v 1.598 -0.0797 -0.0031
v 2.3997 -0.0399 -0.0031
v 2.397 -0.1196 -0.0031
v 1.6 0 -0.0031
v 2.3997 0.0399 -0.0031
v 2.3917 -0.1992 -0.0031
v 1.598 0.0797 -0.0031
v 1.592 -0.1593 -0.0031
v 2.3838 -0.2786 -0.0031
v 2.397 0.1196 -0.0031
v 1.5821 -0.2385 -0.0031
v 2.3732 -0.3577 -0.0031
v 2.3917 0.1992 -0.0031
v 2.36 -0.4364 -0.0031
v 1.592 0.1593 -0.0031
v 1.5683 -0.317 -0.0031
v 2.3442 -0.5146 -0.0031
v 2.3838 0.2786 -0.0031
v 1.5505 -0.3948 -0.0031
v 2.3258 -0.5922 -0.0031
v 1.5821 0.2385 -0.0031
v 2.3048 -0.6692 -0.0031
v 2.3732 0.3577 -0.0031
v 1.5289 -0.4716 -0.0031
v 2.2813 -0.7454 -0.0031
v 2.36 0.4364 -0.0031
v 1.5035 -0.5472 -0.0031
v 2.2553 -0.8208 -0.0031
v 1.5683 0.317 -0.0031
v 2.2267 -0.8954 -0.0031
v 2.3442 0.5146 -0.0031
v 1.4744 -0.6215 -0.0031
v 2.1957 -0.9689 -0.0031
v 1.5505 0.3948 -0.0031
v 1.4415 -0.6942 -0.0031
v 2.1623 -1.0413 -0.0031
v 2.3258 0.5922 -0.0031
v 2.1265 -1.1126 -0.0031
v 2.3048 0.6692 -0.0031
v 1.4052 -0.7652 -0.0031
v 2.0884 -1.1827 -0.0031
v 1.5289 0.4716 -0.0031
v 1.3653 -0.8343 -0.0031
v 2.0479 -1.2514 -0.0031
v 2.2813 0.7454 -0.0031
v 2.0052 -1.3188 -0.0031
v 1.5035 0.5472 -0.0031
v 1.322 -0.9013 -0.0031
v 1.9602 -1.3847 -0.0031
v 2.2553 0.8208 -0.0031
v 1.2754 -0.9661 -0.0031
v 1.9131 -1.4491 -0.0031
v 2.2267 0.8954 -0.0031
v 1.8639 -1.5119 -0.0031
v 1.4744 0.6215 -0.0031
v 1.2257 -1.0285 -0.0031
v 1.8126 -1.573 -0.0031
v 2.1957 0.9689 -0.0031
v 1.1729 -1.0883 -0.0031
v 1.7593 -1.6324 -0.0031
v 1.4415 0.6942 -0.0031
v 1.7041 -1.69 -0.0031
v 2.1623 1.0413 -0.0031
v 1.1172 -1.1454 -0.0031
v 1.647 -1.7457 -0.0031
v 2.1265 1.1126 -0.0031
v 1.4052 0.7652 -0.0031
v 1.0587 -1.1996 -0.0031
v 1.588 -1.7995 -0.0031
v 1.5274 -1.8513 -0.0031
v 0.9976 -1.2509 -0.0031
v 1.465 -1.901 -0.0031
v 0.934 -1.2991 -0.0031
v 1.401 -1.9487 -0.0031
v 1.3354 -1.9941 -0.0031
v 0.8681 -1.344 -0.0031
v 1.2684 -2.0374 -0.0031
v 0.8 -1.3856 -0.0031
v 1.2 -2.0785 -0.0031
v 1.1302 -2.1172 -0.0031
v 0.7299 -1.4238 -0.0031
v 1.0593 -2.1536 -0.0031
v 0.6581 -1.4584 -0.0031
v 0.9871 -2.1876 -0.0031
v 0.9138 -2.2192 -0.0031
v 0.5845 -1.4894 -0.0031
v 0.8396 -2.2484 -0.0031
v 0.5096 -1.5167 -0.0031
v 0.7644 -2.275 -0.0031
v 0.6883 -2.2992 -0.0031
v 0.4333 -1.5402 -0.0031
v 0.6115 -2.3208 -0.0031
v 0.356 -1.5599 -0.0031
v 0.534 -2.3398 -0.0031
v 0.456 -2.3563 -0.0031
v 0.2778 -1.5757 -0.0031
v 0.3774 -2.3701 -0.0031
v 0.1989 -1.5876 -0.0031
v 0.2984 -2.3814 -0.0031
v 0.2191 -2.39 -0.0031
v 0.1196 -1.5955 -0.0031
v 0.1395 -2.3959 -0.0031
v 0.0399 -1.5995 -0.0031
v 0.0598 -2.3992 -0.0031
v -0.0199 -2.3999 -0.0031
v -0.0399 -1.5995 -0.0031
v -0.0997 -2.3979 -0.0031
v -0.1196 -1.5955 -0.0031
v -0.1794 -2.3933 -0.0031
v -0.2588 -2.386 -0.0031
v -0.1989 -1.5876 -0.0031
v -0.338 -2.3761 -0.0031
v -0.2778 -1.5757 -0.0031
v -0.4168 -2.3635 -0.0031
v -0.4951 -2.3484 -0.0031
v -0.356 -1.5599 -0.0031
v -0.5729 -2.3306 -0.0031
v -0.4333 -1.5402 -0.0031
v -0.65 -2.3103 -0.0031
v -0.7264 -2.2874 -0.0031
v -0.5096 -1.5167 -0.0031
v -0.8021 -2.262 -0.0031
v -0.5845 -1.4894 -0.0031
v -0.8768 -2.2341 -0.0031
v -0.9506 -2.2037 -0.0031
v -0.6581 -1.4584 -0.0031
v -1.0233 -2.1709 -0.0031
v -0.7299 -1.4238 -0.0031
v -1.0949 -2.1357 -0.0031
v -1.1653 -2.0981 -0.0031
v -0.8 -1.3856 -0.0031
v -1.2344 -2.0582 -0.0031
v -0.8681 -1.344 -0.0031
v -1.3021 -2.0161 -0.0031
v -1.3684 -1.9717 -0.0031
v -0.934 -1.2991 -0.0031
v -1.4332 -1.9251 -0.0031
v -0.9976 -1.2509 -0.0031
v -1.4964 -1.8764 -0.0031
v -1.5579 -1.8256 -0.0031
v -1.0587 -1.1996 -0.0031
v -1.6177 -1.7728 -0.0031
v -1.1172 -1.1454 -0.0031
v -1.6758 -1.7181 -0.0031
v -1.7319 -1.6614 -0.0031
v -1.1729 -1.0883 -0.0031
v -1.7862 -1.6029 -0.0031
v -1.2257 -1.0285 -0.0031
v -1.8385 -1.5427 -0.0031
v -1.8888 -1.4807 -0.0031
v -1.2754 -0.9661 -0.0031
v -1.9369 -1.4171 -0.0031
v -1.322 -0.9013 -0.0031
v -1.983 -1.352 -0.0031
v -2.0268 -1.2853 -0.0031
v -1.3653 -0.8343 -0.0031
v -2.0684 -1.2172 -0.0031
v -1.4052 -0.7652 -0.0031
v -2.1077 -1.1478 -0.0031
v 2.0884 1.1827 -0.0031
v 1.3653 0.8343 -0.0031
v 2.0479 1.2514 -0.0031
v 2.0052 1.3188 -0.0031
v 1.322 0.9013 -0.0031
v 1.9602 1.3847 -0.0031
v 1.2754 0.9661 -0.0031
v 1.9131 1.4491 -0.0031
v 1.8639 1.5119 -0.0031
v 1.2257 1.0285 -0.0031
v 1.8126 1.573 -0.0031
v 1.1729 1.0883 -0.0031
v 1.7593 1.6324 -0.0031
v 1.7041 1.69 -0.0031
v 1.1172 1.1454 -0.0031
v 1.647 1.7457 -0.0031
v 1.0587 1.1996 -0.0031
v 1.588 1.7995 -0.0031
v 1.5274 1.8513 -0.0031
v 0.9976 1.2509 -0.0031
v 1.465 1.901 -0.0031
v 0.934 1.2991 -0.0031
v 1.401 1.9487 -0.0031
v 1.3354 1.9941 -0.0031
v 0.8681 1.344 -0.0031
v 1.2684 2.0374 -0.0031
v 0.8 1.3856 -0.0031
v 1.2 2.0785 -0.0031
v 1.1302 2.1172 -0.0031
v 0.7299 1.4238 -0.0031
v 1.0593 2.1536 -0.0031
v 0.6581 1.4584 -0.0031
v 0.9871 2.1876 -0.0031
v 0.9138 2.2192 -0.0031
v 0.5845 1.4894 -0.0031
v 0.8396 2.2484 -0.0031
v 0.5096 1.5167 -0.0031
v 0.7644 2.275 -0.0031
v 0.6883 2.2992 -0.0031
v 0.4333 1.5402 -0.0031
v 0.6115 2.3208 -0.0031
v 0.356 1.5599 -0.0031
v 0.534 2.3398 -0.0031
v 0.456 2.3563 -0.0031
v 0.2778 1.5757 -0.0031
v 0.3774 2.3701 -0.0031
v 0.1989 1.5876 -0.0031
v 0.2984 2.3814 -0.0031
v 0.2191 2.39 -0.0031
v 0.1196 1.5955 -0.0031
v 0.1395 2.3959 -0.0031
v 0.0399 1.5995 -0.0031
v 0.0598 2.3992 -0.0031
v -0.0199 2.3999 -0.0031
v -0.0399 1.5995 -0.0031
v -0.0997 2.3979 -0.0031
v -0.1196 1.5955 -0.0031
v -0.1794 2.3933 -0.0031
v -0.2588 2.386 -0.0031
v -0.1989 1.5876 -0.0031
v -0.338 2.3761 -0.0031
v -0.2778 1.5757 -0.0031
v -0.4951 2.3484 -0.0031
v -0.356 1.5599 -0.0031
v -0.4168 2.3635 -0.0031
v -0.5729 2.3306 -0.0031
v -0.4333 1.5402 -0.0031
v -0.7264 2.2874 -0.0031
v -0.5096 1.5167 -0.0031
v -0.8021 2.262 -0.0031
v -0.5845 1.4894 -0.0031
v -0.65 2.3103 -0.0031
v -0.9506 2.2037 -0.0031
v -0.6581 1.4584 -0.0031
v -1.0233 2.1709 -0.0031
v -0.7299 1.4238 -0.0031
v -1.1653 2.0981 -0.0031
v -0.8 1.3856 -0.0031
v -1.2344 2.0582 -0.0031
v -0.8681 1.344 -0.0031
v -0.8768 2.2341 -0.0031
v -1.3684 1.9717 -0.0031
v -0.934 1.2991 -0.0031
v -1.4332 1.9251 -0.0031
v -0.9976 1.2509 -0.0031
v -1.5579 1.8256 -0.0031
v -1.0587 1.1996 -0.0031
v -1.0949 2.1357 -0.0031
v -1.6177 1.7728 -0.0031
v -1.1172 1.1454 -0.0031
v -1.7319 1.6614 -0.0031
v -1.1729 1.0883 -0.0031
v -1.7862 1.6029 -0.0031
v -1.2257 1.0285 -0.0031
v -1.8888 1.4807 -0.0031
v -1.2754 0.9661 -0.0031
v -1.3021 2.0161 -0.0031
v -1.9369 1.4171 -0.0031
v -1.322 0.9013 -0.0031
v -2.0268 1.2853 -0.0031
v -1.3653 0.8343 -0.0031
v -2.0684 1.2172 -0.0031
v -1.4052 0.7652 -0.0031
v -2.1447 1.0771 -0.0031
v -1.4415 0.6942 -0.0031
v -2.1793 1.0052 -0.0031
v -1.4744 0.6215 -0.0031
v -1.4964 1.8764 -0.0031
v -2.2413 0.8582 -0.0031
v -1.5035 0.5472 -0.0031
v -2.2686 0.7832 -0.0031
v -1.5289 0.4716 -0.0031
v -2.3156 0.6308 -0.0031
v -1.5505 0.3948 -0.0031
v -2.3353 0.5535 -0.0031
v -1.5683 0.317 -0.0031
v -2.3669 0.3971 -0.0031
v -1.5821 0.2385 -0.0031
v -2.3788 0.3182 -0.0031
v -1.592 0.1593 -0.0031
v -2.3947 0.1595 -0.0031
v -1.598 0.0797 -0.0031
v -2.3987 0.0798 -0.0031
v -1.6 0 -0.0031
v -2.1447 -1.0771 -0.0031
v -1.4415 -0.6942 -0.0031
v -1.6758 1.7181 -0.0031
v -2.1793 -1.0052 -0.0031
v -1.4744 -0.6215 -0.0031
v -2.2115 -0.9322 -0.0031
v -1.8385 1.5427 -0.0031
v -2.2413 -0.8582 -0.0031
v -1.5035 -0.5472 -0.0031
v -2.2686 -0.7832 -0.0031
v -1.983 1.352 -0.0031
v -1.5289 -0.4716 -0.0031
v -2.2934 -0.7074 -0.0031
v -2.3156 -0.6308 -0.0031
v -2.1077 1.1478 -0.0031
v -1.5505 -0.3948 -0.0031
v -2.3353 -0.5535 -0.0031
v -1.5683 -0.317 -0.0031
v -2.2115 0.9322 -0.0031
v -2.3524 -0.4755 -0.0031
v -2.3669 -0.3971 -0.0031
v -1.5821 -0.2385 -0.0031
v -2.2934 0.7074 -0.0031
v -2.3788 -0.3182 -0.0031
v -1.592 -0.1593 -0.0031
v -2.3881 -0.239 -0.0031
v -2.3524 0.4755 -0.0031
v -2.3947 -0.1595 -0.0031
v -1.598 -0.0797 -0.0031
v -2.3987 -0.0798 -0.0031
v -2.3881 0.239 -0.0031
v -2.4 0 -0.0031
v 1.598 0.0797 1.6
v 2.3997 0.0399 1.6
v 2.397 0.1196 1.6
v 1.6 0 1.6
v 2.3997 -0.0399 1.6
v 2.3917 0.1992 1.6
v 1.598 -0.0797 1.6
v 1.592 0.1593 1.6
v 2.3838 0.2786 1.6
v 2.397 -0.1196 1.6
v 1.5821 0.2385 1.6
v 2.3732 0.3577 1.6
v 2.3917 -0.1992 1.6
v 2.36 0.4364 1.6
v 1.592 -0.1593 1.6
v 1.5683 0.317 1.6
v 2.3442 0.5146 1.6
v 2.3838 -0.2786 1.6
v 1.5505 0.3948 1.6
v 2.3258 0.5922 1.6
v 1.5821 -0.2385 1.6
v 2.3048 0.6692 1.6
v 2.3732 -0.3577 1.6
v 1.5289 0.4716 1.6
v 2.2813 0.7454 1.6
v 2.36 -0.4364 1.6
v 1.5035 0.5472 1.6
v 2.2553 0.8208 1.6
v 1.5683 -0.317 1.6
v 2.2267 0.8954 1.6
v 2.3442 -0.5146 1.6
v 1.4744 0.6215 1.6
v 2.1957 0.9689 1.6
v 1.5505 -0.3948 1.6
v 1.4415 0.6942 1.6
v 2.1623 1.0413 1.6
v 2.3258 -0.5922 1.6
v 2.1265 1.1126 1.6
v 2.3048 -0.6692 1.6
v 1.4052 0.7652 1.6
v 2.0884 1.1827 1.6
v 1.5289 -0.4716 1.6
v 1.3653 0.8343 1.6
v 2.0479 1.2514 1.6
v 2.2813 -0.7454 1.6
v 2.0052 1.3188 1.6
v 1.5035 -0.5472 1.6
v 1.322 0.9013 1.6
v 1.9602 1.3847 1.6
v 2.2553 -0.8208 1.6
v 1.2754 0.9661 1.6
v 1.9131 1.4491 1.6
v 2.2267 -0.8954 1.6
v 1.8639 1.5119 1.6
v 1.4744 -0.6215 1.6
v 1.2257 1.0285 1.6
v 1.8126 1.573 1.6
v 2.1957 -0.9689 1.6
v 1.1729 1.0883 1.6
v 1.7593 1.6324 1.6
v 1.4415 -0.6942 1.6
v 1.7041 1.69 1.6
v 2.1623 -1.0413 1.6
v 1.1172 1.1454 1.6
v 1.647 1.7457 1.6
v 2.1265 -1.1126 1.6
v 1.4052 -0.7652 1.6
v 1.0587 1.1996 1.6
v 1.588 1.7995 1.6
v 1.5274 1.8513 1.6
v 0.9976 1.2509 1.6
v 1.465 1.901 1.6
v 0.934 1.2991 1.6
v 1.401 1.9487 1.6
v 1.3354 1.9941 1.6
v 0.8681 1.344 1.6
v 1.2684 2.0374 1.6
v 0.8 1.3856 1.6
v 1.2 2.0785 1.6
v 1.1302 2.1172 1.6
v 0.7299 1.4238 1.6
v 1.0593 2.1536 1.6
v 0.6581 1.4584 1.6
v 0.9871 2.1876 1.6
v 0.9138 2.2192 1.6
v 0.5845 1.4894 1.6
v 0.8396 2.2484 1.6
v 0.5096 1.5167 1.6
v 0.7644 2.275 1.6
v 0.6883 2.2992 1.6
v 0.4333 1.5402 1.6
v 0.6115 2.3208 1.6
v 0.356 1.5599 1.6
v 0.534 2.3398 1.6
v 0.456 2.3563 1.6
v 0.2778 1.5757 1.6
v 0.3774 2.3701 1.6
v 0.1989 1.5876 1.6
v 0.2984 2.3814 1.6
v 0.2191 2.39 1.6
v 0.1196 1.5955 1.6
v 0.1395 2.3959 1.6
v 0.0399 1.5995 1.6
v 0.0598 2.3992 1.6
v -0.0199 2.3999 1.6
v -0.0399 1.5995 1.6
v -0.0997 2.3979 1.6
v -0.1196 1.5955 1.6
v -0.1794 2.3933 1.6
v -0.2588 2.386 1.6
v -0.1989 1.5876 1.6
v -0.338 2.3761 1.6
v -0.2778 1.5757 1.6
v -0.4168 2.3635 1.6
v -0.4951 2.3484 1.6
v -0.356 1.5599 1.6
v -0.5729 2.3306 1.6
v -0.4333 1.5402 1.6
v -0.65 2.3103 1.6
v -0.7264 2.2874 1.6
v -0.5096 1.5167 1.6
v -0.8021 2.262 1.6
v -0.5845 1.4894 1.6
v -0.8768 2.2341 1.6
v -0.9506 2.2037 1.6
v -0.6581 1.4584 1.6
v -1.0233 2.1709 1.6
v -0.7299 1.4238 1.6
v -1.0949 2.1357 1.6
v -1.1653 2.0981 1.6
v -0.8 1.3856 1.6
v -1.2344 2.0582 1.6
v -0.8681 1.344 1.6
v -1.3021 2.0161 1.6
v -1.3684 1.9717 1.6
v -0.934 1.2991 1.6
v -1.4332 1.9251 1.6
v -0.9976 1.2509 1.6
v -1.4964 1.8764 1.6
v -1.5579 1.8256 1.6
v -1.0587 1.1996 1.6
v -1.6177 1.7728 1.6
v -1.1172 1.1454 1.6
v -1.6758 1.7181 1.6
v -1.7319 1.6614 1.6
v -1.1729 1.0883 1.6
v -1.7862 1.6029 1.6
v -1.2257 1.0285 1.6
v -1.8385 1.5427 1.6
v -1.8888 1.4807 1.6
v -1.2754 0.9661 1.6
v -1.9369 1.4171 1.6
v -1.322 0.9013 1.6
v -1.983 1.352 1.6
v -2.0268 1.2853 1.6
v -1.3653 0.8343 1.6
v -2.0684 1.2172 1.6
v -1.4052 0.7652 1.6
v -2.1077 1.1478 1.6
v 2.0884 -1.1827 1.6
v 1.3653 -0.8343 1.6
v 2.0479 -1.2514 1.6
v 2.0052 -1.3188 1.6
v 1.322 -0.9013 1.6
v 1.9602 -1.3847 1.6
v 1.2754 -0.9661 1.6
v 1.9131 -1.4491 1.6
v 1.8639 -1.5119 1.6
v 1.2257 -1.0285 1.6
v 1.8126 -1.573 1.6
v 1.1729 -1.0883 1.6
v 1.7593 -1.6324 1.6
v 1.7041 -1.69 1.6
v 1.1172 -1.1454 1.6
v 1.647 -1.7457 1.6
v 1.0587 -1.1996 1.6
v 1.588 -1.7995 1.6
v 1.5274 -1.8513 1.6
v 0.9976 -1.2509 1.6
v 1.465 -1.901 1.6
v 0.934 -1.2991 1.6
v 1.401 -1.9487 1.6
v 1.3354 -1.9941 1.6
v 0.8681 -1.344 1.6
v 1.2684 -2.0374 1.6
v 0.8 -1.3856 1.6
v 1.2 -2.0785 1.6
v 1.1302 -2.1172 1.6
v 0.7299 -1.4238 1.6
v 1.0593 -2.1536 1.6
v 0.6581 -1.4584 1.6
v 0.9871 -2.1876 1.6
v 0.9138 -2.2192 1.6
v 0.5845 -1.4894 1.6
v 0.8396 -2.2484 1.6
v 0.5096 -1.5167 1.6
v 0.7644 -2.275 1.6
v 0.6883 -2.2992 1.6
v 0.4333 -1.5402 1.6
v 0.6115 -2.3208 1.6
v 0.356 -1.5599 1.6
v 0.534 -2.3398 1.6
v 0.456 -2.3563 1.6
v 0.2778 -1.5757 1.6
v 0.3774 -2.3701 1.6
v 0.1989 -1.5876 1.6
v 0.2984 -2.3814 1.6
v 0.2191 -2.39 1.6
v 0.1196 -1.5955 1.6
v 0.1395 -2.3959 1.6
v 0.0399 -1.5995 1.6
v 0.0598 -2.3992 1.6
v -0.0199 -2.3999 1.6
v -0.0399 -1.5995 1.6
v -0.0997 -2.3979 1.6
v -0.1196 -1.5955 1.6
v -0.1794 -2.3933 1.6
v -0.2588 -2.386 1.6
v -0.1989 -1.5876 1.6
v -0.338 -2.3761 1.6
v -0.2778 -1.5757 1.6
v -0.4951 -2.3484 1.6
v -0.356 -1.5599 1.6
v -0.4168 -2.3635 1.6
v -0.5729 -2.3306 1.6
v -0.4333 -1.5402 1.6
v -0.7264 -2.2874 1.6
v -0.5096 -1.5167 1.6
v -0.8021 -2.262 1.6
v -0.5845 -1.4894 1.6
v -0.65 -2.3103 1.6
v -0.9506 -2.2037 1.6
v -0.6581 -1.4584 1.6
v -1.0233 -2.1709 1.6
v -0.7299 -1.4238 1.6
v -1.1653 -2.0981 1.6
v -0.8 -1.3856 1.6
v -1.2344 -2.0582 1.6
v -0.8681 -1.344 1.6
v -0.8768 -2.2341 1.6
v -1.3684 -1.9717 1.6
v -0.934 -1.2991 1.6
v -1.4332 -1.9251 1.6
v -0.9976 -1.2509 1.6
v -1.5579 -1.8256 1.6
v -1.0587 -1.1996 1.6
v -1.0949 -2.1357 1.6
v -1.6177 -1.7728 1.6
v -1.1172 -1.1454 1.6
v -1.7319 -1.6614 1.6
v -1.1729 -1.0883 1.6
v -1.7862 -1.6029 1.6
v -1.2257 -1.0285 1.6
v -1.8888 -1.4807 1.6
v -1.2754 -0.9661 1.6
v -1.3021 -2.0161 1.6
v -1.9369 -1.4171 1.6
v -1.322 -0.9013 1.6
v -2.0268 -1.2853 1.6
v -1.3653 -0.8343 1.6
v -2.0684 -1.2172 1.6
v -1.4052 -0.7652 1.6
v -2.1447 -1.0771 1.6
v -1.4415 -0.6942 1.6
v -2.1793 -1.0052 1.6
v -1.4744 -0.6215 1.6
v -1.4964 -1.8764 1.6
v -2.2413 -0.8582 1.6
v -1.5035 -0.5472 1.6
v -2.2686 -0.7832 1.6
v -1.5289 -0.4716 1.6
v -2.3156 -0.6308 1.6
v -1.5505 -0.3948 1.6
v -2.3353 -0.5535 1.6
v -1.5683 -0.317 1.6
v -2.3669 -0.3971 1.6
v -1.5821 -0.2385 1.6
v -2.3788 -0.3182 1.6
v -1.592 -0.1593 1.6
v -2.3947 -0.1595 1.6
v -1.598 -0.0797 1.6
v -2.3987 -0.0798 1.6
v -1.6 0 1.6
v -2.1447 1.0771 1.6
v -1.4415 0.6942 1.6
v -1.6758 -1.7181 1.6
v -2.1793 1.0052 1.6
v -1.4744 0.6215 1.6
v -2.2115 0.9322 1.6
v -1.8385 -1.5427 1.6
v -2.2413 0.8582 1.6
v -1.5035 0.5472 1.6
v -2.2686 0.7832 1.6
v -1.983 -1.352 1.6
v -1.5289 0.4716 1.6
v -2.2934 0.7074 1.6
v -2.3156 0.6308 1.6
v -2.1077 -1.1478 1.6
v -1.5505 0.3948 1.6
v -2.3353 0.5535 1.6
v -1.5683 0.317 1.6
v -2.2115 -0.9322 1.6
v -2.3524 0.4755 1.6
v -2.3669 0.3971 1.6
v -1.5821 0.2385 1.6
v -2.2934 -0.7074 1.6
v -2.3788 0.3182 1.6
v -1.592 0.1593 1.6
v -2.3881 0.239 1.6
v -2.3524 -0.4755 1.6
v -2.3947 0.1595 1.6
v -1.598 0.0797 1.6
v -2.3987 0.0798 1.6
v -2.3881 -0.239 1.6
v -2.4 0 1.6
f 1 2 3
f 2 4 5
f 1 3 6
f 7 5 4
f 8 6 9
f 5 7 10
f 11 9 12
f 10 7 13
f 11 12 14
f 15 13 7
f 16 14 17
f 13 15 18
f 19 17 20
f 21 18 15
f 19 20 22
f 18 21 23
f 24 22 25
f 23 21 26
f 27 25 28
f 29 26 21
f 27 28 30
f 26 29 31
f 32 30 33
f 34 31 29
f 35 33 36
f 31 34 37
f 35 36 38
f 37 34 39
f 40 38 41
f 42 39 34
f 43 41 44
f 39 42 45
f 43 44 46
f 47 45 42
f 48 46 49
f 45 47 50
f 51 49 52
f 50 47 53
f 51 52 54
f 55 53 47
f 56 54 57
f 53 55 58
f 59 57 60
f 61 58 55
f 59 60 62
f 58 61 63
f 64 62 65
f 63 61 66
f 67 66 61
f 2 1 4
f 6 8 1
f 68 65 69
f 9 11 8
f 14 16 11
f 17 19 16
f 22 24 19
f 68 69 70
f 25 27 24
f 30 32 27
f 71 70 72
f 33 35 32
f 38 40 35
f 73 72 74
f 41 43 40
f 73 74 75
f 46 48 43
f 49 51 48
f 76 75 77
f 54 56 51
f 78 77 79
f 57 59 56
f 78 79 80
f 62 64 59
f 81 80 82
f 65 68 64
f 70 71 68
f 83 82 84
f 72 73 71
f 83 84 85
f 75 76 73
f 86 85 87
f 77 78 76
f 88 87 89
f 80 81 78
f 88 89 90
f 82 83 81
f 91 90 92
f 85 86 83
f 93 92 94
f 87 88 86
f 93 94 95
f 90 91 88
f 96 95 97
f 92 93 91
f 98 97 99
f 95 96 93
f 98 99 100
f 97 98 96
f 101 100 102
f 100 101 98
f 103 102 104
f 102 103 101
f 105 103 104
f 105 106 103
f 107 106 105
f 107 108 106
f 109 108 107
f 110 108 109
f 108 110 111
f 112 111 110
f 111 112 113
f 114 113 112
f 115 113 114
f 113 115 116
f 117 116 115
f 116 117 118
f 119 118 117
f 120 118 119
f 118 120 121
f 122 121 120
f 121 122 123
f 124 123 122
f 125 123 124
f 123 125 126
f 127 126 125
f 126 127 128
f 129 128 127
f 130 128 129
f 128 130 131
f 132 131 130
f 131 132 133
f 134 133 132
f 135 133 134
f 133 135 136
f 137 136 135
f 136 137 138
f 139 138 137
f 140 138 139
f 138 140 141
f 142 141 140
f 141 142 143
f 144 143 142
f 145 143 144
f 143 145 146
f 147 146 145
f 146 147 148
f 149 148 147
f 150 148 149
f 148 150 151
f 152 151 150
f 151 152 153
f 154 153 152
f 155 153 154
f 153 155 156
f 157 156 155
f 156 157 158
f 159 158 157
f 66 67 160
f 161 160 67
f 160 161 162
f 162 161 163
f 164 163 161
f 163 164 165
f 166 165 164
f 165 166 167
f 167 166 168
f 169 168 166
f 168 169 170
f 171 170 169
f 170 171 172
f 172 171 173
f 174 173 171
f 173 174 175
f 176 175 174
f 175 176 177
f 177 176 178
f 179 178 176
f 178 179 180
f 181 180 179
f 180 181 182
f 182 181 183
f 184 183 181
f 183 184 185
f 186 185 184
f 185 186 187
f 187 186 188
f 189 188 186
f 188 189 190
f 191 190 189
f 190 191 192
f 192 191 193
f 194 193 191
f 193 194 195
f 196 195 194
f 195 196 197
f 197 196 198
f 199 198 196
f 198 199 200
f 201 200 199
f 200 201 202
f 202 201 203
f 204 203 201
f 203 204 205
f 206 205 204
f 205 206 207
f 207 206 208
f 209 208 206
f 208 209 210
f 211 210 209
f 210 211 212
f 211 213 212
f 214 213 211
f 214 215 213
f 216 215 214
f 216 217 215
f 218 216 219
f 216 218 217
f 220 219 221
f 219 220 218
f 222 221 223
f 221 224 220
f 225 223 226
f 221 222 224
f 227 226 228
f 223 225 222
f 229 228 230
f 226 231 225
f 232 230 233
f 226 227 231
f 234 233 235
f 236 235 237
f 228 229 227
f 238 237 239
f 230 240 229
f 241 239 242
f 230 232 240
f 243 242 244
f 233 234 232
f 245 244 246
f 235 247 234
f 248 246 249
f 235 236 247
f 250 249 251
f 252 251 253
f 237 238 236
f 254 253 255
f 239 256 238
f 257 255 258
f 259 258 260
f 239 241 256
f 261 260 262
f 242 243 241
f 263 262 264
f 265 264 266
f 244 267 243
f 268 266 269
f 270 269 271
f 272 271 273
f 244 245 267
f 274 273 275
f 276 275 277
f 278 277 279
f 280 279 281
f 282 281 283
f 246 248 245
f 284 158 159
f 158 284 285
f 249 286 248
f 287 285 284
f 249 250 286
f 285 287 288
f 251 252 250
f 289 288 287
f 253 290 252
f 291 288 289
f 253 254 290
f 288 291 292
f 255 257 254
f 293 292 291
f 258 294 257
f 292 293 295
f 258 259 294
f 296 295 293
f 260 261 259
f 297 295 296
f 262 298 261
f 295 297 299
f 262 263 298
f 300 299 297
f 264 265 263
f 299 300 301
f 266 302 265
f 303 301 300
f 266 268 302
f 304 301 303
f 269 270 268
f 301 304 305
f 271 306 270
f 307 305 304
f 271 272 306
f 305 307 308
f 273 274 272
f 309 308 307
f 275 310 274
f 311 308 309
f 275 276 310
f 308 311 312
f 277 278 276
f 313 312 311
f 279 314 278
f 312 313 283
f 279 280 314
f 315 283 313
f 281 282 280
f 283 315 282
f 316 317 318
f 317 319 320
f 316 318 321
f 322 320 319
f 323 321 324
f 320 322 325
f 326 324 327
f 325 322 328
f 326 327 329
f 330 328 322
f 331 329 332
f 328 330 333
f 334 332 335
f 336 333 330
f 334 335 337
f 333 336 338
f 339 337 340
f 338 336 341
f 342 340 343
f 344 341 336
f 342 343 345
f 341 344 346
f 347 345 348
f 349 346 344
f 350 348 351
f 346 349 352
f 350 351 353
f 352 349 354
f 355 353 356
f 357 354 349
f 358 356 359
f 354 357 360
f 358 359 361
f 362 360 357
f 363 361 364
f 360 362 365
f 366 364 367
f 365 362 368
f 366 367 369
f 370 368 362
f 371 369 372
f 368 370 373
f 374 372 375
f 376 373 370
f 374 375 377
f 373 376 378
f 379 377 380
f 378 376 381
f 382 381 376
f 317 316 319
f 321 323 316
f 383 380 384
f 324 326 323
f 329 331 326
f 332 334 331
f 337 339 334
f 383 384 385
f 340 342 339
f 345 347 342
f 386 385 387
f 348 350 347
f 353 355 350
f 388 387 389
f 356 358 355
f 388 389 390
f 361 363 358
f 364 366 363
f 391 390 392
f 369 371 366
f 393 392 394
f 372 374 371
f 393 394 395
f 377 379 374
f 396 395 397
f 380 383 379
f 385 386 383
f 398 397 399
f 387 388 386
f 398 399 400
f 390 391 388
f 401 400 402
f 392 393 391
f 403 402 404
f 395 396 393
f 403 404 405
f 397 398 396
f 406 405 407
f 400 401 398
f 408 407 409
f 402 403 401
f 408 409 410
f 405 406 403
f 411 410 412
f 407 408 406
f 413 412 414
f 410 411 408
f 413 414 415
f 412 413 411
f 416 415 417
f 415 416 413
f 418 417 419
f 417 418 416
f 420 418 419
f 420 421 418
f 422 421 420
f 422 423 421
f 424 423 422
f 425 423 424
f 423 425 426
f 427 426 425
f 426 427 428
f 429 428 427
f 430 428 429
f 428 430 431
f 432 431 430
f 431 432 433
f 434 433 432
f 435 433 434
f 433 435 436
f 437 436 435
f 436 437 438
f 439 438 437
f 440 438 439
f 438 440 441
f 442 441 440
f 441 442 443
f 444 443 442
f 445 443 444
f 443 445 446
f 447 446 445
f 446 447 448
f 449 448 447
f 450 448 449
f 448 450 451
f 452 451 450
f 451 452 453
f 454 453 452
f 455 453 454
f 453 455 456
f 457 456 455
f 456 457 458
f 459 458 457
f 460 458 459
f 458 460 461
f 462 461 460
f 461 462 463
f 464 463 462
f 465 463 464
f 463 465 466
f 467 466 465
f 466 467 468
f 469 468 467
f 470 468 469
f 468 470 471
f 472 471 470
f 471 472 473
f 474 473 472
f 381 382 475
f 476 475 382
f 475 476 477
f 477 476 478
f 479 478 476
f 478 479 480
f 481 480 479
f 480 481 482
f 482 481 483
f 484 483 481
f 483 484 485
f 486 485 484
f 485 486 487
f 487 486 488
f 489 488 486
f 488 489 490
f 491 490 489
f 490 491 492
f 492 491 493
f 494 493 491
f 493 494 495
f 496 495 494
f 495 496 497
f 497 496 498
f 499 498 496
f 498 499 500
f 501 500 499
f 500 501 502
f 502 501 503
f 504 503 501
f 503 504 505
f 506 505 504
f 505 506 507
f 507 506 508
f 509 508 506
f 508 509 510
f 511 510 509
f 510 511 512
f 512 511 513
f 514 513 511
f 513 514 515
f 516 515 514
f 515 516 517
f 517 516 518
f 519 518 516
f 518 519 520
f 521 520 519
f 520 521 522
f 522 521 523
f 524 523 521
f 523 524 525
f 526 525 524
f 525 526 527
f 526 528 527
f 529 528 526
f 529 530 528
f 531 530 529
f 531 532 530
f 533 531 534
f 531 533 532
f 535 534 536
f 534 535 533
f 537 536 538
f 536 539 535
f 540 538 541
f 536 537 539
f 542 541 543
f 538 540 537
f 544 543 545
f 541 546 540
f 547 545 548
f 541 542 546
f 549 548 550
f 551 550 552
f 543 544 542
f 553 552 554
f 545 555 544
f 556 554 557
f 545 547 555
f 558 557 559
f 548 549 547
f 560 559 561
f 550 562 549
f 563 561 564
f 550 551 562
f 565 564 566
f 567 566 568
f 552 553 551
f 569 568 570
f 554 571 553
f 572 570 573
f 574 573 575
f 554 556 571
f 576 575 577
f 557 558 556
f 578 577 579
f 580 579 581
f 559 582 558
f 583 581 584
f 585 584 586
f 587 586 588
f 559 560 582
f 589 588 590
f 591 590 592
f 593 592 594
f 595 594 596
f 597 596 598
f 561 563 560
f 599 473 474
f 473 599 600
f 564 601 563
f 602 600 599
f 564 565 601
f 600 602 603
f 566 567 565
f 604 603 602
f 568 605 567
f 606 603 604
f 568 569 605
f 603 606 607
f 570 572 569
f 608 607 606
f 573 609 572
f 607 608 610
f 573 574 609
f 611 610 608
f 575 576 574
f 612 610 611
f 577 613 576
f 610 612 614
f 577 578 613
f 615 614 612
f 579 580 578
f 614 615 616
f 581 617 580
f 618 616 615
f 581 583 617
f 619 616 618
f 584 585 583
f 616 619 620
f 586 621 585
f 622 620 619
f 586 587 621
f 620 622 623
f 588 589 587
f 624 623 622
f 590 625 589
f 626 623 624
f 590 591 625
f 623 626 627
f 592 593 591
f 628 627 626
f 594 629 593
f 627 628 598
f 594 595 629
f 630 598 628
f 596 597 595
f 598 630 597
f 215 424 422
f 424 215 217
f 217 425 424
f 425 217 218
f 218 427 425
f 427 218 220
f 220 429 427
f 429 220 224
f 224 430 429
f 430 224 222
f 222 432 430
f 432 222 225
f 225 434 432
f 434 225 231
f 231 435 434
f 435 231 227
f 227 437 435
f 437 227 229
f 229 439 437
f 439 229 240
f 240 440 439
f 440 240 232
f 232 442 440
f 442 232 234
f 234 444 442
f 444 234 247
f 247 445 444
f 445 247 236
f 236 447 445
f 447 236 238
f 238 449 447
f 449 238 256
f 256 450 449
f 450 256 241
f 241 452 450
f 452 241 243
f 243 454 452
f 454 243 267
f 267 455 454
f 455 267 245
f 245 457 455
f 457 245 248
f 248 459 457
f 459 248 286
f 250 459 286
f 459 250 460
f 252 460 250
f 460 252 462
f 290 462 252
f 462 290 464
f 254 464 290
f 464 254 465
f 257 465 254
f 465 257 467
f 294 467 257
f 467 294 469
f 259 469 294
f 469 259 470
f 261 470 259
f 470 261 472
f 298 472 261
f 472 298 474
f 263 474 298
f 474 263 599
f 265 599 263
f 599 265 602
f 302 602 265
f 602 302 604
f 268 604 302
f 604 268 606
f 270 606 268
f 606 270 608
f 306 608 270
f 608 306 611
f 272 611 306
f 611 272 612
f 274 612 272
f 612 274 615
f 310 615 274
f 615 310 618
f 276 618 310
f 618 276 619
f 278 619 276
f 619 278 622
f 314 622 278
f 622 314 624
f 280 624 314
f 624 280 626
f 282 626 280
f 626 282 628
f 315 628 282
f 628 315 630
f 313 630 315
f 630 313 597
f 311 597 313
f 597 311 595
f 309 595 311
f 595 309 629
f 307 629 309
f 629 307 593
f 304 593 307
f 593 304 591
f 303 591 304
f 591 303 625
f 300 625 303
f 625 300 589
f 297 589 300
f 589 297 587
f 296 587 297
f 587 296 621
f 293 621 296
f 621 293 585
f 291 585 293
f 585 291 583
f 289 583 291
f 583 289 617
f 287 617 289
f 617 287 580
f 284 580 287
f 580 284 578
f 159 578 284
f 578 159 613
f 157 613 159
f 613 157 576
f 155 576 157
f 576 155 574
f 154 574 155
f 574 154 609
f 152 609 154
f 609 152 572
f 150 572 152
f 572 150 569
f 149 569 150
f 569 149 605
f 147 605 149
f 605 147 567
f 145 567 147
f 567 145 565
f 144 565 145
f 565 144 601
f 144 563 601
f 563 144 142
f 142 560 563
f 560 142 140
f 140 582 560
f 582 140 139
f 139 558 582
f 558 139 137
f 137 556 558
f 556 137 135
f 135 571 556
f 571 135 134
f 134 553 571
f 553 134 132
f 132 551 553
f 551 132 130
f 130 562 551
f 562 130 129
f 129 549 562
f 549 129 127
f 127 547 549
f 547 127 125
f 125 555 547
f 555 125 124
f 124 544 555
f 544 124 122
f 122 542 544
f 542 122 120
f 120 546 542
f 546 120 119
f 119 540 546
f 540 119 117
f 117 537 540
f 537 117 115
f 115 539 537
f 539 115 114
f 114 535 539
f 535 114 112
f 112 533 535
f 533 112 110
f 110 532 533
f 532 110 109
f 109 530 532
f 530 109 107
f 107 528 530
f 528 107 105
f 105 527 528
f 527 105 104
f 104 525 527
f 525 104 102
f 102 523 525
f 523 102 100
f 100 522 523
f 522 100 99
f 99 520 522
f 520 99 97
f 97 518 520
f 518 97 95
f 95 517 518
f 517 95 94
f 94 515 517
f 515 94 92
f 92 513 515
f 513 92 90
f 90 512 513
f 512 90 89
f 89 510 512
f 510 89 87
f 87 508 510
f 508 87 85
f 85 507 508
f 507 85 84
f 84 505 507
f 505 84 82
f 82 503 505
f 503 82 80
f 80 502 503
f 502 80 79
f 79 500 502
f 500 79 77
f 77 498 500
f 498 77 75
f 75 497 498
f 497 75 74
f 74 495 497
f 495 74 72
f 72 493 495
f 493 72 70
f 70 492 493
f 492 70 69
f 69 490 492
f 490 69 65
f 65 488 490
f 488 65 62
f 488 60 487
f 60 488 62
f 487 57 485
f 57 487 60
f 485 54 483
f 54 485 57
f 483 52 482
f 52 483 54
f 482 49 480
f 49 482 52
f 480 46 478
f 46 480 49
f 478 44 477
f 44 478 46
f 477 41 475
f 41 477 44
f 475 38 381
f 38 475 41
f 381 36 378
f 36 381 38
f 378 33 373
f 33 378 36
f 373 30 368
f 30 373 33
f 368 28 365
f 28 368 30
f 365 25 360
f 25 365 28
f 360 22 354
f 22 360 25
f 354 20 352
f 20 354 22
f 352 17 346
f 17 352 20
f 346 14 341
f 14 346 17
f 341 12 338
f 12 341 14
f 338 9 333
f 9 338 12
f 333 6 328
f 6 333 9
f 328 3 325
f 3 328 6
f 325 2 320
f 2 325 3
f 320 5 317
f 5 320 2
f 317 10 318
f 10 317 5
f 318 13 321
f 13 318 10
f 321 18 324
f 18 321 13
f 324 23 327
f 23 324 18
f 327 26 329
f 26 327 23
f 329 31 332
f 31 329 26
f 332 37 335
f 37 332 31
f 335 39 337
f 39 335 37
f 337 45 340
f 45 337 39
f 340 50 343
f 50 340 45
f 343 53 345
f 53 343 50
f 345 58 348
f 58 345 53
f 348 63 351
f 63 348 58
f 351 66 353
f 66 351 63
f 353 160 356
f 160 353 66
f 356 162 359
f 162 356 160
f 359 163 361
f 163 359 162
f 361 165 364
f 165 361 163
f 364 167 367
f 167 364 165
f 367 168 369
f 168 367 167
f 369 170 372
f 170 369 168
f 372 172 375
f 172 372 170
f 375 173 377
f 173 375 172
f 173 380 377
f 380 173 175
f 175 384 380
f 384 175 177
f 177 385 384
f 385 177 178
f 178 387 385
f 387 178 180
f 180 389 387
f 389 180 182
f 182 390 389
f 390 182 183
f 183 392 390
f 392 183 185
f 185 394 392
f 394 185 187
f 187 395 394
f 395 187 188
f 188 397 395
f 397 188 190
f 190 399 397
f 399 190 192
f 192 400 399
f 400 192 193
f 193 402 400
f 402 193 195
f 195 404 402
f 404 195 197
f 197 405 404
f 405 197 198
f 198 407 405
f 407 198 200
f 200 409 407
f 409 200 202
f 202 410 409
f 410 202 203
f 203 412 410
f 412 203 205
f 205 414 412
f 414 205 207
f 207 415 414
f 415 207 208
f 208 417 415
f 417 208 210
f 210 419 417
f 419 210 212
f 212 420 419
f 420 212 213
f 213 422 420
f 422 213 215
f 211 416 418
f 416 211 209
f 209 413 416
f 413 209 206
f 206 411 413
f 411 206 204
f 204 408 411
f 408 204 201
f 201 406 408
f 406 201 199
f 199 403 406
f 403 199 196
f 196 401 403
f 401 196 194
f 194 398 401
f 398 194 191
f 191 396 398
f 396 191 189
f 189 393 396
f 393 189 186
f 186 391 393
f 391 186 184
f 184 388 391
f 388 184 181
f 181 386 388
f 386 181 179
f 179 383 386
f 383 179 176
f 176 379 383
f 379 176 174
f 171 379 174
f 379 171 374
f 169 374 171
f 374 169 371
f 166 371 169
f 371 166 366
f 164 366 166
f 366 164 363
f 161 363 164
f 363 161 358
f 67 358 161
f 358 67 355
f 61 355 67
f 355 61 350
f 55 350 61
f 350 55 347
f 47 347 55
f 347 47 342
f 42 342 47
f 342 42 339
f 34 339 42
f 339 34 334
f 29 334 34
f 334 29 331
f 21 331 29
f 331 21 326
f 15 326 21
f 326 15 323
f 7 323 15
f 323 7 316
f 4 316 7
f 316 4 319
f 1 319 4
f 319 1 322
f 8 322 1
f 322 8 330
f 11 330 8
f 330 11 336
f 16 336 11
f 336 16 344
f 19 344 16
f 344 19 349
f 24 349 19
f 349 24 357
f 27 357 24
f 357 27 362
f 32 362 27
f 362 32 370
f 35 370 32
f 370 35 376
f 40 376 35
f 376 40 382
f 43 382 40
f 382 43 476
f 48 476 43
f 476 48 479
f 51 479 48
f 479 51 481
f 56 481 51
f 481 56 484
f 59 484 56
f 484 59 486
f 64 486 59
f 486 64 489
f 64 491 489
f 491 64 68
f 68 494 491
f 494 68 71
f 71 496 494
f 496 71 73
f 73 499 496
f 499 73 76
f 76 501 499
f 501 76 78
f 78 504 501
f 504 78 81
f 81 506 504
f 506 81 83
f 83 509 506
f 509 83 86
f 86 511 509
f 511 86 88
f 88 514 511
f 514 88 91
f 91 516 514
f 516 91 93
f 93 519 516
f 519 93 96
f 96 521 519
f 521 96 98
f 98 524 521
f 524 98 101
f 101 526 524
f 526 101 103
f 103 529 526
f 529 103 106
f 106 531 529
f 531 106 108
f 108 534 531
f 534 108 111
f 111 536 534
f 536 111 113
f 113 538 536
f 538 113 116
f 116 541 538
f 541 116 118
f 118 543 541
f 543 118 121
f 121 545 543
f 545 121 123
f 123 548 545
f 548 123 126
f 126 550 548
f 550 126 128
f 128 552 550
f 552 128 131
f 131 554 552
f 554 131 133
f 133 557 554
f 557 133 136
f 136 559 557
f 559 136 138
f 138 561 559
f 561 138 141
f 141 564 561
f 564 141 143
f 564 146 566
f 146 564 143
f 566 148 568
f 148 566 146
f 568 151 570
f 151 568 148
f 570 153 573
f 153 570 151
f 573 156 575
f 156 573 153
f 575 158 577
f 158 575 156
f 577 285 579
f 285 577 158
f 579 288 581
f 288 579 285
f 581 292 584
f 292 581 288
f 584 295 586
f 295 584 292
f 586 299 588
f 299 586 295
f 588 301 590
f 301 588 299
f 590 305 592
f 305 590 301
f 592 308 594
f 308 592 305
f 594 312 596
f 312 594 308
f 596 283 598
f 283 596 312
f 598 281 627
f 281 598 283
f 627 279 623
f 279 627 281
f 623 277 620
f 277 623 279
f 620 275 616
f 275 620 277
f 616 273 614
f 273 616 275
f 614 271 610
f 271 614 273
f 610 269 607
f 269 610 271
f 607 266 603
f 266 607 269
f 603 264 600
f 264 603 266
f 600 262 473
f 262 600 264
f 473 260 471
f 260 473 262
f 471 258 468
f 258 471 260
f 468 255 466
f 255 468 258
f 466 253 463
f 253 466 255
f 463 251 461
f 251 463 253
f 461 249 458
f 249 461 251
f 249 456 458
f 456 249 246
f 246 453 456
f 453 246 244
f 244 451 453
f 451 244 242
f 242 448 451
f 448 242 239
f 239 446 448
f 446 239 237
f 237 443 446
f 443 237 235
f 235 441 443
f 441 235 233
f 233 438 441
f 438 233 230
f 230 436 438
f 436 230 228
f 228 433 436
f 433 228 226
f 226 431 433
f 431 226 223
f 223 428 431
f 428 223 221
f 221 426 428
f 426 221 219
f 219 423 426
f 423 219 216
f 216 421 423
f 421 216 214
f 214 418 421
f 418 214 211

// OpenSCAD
use <../lib.scad>
use <s/3009p17a.scad>
use <s/3900s01.scad>
$fa=1; $fs=0.2;
function ldraw_lib__3900p01(realsolid=false) = [
// 0 Minifig Signal Holder with Black "POLICE" and Red Line Pattern
// 0 Name: 3900p01.dat
// 0 Author: Stephan Meisinger [smr]
// 0 !LDRAW_ORG Part UPDATE 2014-01
// 0 !LICENSE Licensed under CC BY 2.0 and CC BY 4.0 : see CAreadme.txt
// 
// 0 BFC CERTIFY CCW
  [0,"BFC","CERTIFY"],
  [0,"BFC","CCW"],
// 
// 0 !CATEGORY Minifig Accessory
// 0 !KEYWORDS Paddle, sign, town
// 
// 0 !HISTORY 2014-06-21 [PTadmin] Official Update 2014-01
// 
// 
// 1 16 0 0 0 1 0 0 0 1 0 0 0 1 s\3900s01.dat
  [1,16,0,0,0,1,0,0,0,1,0,0,0,1, ldraw_lib__s__3900s01(realsolid)],
// 1 16 -4.8 -0.15 0.25 0 0.415 0 0 0 -0.415 -0.415 0 0 s\3009p17a.dat
  [1,16,-4.8,-0.15,0.25,0,0.415,0,0,0,-0.415,-0.415,0,0, ldraw_lib__s__3009p17a(realsolid)],
// 4 16 3.7075 4 13.115 5.3578 4 12.9346 9.8994 4 9.8994 12.9346 4 5.3578
  [4,16,3.7075,4,13.115,5.3578,4,12.9346,9.8994,4,9.8994,12.9346,4,5.3578],
// 4 16 3.7075 4 13.115 12.9346 4 5.3578 14 4 0 3.7075 4 0.25
  [4,16,3.7075,4,13.115,12.9346,4,5.3578,14,4,0,3.7075,4,0.25],
// 4 16 3.7075 4 0.25 14 4 0 12.9346 4 -5.3578 9.8994 4 -9.8994
  [4,16,3.7075,4,0.25,14,4,0,12.9346,4,-5.3578,9.8994,4,-9.8994],
// 4 16 3.7075 4 0.25 9.8994 4 -9.8994 5.3578 4 -12.9346 3.7075 4 -11.371
  [4,16,3.7075,4,0.25,9.8994,4,-9.8994,5.3578,4,-12.9346,3.7075,4,-11.371],
// 3 16 3.7075 4 -11.371 5.3578 4 -12.9346 3.7075 4 -13.03
  [3,16,3.7075,4,-11.371,5.3578,4,-12.9346,3.7075,4,-13.03],
// 3 16 3.7075 4 -13.03 5.3578 4 -12.9346 0 4 -14
  [3,16,3.7075,4,-13.03,5.3578,4,-12.9346,0,4,-14],
// 3 16 3.7075 4 -13.03 0 4 -14 -3.97 4 -13.03
  [3,16,3.7075,4,-13.03,0,4,-14,-3.97,4,-13.03],
// 3 16 -3.97 4 -13.03 0 4 -14 -5.3578 4.0 -12.9346
  [3,16,-3.97,4,-13.03,0,4,-14,-5.3578,4.0,-12.9346],
// 4 16 -3.97 4 -13.03 -5.3578 4 -12.9346 -9.8994 4 -9.8994 -3.97 4 -9.71
  [4,16,-3.97,4,-13.03,-5.3578,4,-12.9346,-9.8994,4,-9.8994,-3.97,4,-9.71],
// 4 16 -3.97 4 -9.71 -9.8994 4 -9.8994 -12.9346 4 -5.3578 -3.97 4 -6.39
  [4,16,-3.97,4,-9.71,-9.8994,4,-9.8994,-12.9346,4,-5.3578,-3.97,4,-6.39],
// 3 16 -3.97 4 -6.39 -12.9346 4 -5.3578 -3.97 4 -3.2775
  [3,16,-3.97,4,-6.39,-12.9346,4,-5.3578,-3.97,4,-3.2775],
// 3 16 -3.97 4 -3.2775 -12.9346 4 -5.3578 -3.97 4 -2.0324
  [3,16,-3.97,4,-3.2775,-12.9346,4,-5.3578,-3.97,4,-2.0324],
// 4 16 -3.97 4 -2.0324 -12.9346 4 -5.3578 -14 4 0 -3.97 4 0.0425
  [4,16,-3.97,4,-2.0324,-12.9346,4,-5.3578,-14,4,0,-3.97,4,0.0425],
// 4 16 -3.97 4 0.0425 -14 4 0 -12.9346 4 5.3578 -3.97 4 1.2875
  [4,16,-3.97,4,0.0425,-14,4,0,-12.9346,4,5.3578,-3.97,4,1.2875],
// 3 16 -3.97 4 1.2875 -12.9346 4 5.3578 -3.97 4 3.985
  [3,16,-3.97,4,1.2875,-12.9346,4,5.3578,-3.97,4,3.985],
// 4 16 -3.97 4 3.985 -12.9346 4 5.3578 -9.8994 4 9.8994 -3.97 4 5.4375
  [4,16,-3.97,4,3.985,-12.9346,4,5.3578,-9.8994,4,9.8994,-3.97,4,5.4375],
// 3 16 -3.97 4 5.4375 -9.8994 4 9.8994 -3.97 4 9.795
  [3,16,-3.97,4,5.4375,-9.8994,4,9.8994,-3.97,4,9.795],
// 4 16 -3.97 4 9.795 -9.8994 4 9.8994 -5.3578 4 12.9346 -3.97 4 11.6625
  [4,16,-3.97,4,9.795,-9.8994,4,9.8994,-5.3578,4,12.9346,-3.97,4,11.6625],
// 3 16 -3.97 4 11.6625 -5.3578 4 12.9346 -3.97 4 13.115
  [3,16,-3.97,4,11.6625,-5.3578,4,12.9346,-3.97,4,13.115],
// 3 16 -3.97 4 13.115 -5.3578 4 12.9346 0 4 14
  [3,16,-3.97,4,13.115,-5.3578,4,12.9346,0,4,14],
// 3 16 -3.97 4 13.115 0 4 14 2.67 4 13.115
  [3,16,-3.97,4,13.115,0,4,14,2.67,4,13.115],
// 3 16 2.67 4 13.115 0 4 14 3.7075 4 13.115
  [3,16,2.67,4,13.115,0,4,14,3.7075,4,13.115],
// 3 16 3.7075 4 13.115 0 4 14 5.3578 4 12.9346
  [3,16,3.7075,4,13.115,0,4,14,5.3578,4,12.9346],
];
module ldraw_lib__3900p01(step=0, col=false, unit=2/5, alt=false, line=0.2, solid=!$preview)
    makepoly(ldraw_lib__3900p01(solid), step=step, col=col, unit=unit, alt=alt, line=line, solid=solid);
ldraw_lib__3900p01(line=0.2);
